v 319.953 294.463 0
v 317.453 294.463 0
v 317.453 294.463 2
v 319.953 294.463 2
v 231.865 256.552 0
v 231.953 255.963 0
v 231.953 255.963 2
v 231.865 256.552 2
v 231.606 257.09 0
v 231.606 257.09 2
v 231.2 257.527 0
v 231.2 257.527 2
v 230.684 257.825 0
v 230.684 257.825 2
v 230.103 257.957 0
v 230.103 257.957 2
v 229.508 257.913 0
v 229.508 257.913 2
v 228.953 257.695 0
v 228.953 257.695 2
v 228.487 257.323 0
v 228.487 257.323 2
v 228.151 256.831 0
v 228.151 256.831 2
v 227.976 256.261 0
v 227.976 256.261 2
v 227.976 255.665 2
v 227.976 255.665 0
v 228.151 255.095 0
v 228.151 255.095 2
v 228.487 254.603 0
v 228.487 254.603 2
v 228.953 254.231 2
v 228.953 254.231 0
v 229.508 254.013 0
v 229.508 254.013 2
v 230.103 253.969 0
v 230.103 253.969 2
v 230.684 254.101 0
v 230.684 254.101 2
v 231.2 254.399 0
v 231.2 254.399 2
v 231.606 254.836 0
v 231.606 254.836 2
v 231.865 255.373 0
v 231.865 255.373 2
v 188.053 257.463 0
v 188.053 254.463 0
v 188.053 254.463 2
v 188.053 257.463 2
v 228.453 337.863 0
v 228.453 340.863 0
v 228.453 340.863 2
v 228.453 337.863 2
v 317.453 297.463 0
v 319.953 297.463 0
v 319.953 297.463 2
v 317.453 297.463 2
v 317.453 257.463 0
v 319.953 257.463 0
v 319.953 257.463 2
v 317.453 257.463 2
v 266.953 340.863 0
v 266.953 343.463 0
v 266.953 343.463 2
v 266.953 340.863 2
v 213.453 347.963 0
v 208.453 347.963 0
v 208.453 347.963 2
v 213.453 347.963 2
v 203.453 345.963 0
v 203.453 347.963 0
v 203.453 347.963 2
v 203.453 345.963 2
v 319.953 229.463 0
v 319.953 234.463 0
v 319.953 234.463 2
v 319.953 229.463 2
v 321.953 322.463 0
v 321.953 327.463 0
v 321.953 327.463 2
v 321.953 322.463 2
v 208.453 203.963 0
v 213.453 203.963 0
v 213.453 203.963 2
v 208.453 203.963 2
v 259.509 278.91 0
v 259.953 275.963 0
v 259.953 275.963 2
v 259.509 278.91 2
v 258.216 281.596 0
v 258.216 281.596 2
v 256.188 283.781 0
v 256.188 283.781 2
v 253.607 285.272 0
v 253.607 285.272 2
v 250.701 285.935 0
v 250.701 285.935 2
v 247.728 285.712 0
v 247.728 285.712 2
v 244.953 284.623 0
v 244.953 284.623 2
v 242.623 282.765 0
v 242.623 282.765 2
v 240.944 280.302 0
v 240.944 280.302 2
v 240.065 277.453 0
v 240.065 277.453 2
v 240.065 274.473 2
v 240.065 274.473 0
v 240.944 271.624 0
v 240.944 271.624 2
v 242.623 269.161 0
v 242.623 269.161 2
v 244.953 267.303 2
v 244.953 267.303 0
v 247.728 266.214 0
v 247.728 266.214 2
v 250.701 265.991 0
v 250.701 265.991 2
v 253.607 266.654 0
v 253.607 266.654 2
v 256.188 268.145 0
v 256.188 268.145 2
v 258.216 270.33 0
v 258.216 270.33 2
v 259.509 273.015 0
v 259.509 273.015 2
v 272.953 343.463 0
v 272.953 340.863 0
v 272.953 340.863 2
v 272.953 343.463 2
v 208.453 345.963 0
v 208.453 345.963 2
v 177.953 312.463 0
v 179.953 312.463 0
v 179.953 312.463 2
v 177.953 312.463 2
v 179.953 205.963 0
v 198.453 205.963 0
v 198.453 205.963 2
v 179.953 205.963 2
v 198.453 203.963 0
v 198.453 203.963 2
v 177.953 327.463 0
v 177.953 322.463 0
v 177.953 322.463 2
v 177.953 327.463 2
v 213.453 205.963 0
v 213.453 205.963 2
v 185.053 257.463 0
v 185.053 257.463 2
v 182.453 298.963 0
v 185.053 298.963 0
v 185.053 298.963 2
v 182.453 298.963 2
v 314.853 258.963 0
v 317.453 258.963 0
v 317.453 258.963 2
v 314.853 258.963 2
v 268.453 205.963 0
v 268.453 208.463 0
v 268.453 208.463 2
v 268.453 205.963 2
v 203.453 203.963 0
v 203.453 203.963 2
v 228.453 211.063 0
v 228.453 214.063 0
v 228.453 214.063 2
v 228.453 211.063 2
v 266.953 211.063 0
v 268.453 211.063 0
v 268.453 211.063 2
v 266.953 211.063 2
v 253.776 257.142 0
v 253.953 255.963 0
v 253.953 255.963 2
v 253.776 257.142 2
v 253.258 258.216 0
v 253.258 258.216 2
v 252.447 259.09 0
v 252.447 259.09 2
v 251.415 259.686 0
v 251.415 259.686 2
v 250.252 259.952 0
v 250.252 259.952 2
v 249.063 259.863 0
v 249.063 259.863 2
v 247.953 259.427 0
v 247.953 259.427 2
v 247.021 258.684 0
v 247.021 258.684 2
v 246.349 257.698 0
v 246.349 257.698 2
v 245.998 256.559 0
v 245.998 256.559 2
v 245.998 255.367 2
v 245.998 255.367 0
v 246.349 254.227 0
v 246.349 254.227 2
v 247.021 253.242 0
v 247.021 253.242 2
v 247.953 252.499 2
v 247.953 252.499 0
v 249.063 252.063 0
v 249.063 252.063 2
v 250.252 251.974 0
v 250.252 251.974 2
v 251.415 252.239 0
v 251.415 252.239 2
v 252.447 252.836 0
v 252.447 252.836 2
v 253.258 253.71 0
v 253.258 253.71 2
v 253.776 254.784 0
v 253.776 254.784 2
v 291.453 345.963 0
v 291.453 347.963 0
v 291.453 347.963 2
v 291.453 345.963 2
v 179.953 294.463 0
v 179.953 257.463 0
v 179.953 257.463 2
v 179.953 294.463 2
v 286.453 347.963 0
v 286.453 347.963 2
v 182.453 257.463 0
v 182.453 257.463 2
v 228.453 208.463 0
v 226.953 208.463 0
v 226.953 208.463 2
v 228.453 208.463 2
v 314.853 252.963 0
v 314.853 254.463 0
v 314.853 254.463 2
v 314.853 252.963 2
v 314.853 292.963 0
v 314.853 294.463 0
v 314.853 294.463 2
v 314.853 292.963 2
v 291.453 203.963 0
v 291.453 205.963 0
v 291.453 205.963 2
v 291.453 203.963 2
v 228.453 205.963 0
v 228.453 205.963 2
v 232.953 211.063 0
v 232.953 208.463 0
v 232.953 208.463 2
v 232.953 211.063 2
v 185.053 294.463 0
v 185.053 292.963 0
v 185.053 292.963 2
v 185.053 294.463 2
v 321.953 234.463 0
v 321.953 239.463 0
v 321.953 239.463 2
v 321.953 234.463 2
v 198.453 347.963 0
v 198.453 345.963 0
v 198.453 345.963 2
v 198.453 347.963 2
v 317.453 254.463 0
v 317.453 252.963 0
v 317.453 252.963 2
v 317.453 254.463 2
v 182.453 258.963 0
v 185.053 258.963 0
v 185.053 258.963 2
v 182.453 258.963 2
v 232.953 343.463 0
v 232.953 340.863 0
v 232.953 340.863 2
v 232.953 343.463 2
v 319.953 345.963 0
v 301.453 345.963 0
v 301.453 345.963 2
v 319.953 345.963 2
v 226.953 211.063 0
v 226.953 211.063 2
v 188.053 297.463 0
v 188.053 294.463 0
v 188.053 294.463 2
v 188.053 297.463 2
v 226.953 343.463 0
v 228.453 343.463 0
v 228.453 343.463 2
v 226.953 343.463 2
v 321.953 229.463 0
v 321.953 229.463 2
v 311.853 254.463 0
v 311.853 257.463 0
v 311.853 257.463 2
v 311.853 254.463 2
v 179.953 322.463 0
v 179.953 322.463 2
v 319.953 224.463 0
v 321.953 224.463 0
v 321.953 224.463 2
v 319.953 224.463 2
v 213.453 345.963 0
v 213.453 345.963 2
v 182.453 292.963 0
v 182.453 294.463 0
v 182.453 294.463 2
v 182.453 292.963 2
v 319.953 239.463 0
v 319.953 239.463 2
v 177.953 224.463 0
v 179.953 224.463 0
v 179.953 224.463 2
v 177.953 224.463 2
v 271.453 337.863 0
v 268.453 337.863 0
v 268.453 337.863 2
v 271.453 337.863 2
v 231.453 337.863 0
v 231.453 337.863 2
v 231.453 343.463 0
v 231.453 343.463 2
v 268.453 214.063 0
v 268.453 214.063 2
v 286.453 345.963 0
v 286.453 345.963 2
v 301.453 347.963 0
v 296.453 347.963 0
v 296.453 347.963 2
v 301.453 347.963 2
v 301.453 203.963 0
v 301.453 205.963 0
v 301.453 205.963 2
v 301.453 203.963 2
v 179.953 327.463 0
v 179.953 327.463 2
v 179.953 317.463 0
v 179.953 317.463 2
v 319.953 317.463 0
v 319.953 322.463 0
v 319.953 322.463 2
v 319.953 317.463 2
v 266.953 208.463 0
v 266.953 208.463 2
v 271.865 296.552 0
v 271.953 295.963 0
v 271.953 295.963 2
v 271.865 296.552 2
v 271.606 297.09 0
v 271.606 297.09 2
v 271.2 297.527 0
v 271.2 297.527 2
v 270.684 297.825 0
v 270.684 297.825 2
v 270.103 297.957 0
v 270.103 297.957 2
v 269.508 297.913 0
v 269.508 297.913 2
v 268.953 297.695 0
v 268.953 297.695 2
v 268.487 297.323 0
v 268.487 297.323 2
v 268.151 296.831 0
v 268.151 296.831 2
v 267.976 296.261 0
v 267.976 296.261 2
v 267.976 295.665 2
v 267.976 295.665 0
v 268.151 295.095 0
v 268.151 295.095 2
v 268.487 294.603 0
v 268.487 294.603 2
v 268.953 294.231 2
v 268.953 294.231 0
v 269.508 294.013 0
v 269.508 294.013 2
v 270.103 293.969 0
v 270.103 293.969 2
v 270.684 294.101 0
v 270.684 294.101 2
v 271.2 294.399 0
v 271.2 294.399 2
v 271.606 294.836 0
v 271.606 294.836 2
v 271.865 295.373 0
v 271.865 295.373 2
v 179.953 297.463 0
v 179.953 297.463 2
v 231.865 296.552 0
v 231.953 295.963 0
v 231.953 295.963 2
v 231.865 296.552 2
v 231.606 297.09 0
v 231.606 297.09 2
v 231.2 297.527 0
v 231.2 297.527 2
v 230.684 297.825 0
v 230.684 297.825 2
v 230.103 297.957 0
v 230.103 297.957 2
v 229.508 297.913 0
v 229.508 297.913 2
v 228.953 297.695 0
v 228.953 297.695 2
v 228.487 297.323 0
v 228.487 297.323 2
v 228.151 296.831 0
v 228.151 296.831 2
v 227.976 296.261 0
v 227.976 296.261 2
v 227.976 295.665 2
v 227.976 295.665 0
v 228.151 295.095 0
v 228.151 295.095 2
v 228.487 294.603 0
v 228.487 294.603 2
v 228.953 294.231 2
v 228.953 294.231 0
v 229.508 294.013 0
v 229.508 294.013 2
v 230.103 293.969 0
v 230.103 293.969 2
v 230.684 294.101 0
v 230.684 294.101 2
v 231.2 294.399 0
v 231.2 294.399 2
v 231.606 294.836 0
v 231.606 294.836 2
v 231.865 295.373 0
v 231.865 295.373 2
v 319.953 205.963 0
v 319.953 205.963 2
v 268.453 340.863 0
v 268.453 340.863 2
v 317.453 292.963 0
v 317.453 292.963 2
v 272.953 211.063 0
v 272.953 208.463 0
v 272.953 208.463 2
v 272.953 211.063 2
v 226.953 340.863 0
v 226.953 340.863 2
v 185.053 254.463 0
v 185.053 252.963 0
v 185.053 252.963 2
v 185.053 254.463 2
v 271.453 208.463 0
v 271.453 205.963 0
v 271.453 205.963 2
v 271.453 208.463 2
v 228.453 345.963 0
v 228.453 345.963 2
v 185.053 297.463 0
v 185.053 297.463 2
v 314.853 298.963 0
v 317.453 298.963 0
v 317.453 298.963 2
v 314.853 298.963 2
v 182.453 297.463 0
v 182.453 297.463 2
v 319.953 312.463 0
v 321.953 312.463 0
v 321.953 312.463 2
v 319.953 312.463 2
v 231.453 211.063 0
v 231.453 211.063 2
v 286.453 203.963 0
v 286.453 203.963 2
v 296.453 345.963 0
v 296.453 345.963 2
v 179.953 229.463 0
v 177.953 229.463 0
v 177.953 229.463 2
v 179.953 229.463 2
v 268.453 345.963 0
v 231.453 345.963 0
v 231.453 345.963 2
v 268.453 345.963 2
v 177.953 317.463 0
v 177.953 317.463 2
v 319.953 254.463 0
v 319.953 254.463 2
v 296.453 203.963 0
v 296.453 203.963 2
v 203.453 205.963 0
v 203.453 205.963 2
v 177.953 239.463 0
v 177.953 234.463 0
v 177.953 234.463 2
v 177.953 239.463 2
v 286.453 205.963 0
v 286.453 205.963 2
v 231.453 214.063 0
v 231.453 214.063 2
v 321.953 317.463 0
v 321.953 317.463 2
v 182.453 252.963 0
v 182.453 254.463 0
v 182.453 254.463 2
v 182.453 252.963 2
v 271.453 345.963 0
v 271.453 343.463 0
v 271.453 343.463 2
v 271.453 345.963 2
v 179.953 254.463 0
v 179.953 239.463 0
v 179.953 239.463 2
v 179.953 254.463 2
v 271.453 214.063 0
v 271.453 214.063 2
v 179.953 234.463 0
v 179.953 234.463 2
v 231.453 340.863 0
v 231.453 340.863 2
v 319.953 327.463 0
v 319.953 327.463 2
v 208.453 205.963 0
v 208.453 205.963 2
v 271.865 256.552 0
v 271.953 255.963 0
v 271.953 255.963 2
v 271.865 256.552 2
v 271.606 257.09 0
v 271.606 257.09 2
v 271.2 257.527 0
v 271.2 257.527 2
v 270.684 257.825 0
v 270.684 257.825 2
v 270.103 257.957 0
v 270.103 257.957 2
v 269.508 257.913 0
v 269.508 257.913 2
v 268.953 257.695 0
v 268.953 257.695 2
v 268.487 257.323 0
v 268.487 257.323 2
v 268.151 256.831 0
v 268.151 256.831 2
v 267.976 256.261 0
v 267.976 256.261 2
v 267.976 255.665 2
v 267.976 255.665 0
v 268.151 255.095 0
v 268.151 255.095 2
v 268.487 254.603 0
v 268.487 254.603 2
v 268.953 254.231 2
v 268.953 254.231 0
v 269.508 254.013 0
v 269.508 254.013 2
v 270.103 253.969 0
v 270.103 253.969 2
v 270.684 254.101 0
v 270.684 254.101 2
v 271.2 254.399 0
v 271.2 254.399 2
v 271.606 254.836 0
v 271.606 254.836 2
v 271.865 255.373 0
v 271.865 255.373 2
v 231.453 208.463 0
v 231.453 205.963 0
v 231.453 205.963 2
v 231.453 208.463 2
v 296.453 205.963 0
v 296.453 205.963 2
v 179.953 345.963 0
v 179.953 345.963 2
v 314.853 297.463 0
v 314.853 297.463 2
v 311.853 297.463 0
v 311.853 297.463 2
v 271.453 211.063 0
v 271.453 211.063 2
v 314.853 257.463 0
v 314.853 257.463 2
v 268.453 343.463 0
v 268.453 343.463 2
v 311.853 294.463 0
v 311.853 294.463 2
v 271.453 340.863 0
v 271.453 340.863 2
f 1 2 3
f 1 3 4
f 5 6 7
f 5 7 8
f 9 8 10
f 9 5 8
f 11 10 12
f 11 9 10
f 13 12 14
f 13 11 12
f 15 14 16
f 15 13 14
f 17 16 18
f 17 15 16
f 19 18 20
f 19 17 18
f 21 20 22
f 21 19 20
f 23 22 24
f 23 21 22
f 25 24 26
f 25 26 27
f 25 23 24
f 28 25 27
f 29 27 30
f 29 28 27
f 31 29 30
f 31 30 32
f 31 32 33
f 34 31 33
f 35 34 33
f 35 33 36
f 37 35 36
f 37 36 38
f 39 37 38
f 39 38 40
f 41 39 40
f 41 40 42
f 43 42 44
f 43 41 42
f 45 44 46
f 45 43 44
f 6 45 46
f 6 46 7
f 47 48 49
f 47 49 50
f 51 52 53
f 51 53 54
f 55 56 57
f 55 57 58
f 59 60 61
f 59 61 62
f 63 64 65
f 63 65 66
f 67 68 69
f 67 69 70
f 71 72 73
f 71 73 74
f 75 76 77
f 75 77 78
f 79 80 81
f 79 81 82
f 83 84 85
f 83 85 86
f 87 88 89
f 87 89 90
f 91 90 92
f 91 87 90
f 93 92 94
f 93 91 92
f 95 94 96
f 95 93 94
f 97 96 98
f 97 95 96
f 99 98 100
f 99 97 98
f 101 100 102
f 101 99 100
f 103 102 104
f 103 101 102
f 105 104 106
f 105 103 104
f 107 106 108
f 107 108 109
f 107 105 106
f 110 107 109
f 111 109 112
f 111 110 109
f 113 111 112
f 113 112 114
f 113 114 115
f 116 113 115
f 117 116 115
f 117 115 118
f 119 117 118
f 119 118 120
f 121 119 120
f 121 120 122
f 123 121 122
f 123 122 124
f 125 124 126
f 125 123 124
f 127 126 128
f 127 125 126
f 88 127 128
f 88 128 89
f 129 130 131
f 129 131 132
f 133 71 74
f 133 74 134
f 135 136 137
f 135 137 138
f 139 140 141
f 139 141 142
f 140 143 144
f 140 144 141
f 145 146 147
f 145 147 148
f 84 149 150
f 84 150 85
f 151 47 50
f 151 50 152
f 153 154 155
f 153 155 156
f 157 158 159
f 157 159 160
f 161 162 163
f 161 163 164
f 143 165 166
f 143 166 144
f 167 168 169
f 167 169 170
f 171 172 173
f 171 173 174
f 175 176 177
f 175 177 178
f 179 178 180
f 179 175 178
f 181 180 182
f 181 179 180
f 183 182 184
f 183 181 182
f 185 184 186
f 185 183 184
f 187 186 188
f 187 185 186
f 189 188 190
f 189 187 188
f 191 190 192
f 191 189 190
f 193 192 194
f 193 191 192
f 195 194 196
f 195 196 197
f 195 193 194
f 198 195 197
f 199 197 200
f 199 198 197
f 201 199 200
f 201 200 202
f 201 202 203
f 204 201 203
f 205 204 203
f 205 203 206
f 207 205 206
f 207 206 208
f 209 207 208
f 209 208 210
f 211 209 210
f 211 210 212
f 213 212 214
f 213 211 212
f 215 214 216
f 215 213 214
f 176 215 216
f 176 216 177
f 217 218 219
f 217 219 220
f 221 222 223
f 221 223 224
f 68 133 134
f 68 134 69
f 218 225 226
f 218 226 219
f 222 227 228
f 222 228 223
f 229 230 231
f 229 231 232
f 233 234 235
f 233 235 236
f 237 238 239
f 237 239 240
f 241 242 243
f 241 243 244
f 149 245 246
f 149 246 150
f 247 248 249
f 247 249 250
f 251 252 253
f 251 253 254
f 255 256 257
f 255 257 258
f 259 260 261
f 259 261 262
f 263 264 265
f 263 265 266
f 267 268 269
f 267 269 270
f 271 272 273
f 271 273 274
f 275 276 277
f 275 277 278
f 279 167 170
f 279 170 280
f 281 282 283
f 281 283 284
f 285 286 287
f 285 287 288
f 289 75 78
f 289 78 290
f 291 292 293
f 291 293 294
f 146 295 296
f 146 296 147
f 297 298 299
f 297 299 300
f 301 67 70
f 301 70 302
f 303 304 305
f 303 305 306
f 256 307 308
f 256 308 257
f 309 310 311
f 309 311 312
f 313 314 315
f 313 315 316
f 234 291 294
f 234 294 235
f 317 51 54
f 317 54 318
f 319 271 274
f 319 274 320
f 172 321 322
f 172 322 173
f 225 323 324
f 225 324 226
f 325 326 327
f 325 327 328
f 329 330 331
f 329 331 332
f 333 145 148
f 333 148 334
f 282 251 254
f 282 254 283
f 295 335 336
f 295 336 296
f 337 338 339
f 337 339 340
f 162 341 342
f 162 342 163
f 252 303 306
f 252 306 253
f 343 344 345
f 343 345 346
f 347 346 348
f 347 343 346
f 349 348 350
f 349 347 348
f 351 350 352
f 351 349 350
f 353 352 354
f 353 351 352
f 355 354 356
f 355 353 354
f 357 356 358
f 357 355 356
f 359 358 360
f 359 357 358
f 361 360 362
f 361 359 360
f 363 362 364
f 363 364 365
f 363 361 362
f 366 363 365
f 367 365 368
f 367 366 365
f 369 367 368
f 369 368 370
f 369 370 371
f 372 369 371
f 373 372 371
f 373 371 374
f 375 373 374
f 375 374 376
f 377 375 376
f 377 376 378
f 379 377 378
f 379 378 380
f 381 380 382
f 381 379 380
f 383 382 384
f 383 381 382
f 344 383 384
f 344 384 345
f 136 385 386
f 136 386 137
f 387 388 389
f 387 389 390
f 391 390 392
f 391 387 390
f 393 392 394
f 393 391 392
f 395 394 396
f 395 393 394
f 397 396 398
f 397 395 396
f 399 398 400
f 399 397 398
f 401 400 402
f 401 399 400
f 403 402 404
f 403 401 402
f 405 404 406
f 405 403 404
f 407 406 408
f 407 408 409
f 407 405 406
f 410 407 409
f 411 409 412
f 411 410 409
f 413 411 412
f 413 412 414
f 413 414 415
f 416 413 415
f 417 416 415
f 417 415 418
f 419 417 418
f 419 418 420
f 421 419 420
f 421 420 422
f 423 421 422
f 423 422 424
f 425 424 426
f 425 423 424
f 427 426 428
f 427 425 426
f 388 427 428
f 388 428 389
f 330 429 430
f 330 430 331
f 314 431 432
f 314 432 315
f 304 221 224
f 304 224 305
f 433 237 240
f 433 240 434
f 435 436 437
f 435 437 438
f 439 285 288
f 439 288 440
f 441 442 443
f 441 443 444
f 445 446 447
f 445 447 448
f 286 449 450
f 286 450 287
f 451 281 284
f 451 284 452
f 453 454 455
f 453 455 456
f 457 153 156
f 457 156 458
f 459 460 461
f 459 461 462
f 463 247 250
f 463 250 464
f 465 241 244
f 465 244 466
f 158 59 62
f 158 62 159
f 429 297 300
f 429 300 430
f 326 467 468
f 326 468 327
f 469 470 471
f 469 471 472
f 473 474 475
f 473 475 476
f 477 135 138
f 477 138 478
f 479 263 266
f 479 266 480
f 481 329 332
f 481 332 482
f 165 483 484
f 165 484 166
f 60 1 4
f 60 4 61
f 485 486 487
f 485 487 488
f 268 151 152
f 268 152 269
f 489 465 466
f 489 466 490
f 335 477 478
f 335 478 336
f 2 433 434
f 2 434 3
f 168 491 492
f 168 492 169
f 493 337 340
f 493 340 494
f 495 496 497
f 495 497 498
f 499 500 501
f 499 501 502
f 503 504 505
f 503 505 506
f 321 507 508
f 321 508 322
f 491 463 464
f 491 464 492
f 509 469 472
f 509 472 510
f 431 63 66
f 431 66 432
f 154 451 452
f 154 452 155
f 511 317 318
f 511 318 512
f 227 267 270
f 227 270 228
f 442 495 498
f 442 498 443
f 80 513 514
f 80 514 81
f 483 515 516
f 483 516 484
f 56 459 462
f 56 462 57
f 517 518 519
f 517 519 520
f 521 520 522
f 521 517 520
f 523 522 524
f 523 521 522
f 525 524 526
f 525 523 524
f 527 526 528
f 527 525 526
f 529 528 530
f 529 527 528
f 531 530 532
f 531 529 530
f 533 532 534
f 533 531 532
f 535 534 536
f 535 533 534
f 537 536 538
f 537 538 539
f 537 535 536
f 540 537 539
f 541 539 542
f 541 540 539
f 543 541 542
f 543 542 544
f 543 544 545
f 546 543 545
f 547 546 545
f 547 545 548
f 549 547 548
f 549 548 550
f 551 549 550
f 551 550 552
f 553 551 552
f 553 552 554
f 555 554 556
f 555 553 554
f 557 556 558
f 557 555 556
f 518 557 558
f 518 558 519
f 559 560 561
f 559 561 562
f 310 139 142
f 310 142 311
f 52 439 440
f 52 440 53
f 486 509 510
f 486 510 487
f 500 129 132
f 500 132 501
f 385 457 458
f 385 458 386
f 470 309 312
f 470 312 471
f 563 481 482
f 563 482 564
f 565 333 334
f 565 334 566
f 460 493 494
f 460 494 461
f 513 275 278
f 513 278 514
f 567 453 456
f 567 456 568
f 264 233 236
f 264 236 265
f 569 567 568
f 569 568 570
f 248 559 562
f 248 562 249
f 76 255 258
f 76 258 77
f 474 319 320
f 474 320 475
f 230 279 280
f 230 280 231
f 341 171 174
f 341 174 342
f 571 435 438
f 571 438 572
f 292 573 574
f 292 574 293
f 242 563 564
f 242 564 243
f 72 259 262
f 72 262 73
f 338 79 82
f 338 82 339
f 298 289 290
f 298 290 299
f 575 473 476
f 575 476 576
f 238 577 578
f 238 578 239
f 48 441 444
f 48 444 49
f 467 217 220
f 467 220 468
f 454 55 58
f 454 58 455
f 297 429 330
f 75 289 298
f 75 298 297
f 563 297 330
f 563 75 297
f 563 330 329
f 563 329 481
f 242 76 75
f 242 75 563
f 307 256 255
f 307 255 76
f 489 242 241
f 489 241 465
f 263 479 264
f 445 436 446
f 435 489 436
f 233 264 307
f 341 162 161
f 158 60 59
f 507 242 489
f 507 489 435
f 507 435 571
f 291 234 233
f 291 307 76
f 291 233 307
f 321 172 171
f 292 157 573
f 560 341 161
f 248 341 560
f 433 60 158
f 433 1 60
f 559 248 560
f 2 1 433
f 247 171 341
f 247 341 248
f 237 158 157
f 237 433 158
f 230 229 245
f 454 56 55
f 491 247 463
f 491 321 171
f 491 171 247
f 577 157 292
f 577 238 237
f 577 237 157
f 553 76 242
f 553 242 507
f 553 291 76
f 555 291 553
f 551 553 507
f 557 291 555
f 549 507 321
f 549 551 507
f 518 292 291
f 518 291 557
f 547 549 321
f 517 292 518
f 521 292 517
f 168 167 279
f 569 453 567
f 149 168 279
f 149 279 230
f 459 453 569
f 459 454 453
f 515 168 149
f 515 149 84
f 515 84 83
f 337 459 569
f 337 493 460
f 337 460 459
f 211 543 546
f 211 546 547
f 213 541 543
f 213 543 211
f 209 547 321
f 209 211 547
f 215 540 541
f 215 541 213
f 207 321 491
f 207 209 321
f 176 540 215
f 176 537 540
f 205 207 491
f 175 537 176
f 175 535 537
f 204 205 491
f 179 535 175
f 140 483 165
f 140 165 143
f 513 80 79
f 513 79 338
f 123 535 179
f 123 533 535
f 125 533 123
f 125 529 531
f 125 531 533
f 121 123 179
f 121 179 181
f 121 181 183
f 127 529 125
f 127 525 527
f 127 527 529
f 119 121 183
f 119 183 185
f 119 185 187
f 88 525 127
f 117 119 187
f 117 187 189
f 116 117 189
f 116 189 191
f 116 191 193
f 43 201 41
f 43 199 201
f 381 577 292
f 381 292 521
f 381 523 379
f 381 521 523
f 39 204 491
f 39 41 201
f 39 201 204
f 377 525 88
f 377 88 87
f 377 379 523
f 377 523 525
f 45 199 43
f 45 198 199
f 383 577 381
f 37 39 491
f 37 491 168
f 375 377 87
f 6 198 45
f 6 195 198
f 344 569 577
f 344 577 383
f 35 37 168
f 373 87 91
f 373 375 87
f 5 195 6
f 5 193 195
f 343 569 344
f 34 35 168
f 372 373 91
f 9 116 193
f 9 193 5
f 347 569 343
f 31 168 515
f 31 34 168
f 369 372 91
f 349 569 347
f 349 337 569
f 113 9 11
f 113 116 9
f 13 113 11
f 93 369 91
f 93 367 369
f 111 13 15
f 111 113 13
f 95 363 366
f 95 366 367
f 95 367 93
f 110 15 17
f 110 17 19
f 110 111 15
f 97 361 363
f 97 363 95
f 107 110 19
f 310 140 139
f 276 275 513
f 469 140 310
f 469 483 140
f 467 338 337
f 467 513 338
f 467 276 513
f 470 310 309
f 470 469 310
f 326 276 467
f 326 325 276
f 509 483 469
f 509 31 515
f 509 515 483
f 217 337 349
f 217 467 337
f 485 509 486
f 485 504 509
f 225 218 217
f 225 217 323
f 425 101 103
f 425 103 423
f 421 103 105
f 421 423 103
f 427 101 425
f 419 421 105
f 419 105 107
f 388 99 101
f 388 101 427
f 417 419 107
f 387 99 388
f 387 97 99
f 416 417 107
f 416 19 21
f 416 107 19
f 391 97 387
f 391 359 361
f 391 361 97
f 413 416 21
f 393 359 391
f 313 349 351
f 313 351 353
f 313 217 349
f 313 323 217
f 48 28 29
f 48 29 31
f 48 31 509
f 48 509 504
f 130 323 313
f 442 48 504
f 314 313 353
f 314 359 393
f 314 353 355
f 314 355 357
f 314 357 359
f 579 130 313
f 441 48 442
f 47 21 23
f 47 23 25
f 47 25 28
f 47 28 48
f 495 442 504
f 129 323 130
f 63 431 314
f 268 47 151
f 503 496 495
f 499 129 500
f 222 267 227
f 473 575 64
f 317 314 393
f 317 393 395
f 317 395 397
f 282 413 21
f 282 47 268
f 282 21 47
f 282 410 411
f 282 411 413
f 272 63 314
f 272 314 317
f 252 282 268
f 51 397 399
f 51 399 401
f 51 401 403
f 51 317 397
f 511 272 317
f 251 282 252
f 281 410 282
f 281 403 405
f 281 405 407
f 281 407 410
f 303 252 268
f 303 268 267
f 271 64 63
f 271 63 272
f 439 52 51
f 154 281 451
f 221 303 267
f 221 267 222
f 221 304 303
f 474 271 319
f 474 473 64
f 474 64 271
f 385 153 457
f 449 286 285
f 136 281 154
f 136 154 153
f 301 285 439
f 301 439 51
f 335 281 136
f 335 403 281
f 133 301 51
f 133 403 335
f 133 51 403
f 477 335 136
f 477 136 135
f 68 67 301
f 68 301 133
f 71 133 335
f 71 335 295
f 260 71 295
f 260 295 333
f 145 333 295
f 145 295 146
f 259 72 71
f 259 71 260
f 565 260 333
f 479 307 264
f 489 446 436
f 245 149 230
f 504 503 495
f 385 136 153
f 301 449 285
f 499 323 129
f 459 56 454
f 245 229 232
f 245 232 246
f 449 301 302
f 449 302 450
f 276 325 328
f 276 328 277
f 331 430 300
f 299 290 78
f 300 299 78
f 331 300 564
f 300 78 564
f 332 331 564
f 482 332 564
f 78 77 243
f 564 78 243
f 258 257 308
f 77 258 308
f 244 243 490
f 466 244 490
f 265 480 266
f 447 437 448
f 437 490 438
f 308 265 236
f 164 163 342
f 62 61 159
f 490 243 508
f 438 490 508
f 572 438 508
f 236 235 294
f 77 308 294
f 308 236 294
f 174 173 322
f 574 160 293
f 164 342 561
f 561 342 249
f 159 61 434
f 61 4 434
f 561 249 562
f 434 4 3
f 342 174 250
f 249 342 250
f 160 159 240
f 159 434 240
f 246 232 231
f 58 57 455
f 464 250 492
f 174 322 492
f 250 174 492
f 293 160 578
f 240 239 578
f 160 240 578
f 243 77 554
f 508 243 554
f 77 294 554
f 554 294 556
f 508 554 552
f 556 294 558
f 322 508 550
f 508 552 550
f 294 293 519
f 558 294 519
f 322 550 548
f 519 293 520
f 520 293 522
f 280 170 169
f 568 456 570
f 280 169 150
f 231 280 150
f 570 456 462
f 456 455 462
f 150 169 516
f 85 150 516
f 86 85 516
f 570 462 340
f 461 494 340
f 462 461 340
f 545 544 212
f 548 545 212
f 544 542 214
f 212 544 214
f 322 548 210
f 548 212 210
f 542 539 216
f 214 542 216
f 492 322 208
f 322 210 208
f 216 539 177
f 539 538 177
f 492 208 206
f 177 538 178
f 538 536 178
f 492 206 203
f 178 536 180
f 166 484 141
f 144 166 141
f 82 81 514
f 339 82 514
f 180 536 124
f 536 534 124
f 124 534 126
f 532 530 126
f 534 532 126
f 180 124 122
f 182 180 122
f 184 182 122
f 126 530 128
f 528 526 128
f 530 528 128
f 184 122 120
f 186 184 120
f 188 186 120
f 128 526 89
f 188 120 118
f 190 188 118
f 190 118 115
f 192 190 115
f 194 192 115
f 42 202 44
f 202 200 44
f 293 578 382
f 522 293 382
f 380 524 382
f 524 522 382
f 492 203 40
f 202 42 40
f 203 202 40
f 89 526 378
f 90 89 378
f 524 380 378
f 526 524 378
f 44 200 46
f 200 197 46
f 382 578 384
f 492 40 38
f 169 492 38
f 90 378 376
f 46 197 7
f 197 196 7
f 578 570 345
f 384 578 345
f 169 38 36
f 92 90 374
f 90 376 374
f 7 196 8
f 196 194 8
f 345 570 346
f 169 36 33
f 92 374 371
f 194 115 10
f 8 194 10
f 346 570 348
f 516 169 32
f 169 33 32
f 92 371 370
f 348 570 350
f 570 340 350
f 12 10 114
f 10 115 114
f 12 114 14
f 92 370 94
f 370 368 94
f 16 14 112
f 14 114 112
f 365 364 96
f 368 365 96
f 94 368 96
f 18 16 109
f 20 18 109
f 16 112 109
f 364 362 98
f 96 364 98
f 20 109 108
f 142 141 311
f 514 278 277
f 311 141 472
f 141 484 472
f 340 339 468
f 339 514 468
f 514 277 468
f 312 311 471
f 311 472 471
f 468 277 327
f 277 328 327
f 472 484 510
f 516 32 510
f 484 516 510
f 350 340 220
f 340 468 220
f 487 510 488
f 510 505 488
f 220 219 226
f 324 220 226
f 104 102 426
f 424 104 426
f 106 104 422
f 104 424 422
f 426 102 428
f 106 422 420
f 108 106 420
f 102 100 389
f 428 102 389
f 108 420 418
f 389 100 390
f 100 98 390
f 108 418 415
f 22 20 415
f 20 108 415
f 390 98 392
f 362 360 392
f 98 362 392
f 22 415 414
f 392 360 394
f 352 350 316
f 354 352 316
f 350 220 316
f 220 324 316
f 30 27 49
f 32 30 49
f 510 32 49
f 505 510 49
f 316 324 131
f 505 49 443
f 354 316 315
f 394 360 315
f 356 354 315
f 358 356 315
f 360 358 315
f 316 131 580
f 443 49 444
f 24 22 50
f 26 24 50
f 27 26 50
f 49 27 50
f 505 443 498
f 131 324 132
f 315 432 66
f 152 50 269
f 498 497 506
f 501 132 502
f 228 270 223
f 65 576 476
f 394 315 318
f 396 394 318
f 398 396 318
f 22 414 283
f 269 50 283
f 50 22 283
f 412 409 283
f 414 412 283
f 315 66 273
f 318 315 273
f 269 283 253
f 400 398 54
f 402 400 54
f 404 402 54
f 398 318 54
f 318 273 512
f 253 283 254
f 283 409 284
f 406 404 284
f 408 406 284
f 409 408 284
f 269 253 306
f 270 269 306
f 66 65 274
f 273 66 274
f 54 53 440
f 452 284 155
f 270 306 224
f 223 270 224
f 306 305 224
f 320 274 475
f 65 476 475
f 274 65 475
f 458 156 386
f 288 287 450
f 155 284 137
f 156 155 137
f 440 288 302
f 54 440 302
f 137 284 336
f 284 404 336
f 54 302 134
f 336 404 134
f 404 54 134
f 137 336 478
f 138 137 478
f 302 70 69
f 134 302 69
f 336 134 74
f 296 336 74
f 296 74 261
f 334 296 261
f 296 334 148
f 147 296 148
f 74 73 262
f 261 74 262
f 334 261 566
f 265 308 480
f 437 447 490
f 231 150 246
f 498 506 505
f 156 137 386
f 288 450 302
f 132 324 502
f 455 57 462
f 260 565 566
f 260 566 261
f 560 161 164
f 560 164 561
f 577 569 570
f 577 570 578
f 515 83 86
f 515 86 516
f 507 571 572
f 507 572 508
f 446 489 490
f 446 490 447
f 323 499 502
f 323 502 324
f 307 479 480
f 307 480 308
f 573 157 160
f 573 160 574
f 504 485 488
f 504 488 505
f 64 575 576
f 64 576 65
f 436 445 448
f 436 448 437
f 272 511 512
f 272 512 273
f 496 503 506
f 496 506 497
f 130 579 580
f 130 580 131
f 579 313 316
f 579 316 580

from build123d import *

# Parameters (mm, degrees)
SKETCH_1_R      = 10
SKETCH_1_R_2    = 4
SKETCH_1_R_3    = 2
EXTRUDE_1_DEPTH = 2


with BuildPart() as part:
    # 草图1 → 凸台-拉伸1 (new body)
    with BuildSketch(Plane.XY):
        Polygon((317.453360513, 257.462931603), (317.453360513, 258.962931603), (314.853360513, 258.962931603), (314.853360513, 257.462931603), (311.853360513, 257.462931603), (311.853360513, 254.462931603), (314.853360513, 254.462931603), (314.853360513, 252.962931603), (317.453360513, 252.962931603), (317.453360513, 254.462931603), (319.953360513, 254.462931603), (319.953360513, 239.462931603), (321.953360513, 239.462931603), (321.953360513, 234.462931603), (319.953360513, 234.462931603), (319.953360513, 229.462931603), (321.953360513, 229.462931603), (321.953360513, 224.462931603), (319.953360513, 224.462931603), (319.953360513, 205.962931603), (301.453360513, 205.962931603), (301.453360513, 203.962931603), (296.453360513, 203.962931603), (296.453360513, 205.962931603), (291.453360513, 205.962931603), (291.453360513, 203.962931603), (286.453360513, 203.962931603), (286.453360513, 205.962931603), (271.453360513, 205.962931603), (271.453360513, 208.462931603), (272.953360513, 208.462931603), (272.953360513, 211.062931603), (271.453360513, 211.062931603), (271.453360513, 214.062931603), (268.453360513, 214.062931603), (268.453360513, 211.062931603), (266.953360513, 211.062931603), (266.953360513, 208.462931603), (268.453360513, 208.462931603), (268.453360513, 205.962931603), (231.453360513, 205.962931603), (231.453360513, 208.462931603), (232.953360513, 208.462931603), (232.953360513, 211.062931603), (231.453360513, 211.062931603), (231.453360513, 214.062931603), (228.453360513, 214.062931603), (228.453360513, 211.062931603), (226.953360513, 211.062931603), (226.953360513, 208.462931603), (228.453360513, 208.462931603), (228.453360513, 205.962931603), (213.453360513, 205.962931603), (213.453360513, 203.962931603), (208.453360513, 203.962931603), (208.453360513, 205.962931603), (203.453360513, 205.962931603), (203.453360513, 203.962931603), (198.453360513, 203.962931603), (198.453360513, 205.962931603), (179.953360513, 205.962931603), (179.953360513, 224.462931603), (177.953360513, 224.462931603), (177.953360513, 229.462931603), (179.953360513, 229.462931603), (179.953360513, 234.462931603), (177.953360513, 234.462931603), (177.953360513, 239.462931603), (179.953360513, 239.462931603), (179.953360513, 254.462931603), (182.453360513, 254.462931603), (182.453360513, 252.962931603), (185.053360513, 252.962931603), (185.053360513, 254.462931603), (188.053360513, 254.462931603), (188.053360513, 257.462931603), (185.053360513, 257.462931603), (185.053360513, 258.962931603), (182.453360513, 258.962931603), (182.453360513, 257.462931603), (179.953360513, 257.462931603), (179.953360513, 294.462931603), (182.453360513, 294.462931603), (182.453360513, 292.962931603), (185.053360513, 292.962931603), (185.053360513, 294.462931603), (188.053360513, 294.462931603), (188.053360513, 297.462931603), (185.053360513, 297.462931603), (185.053360513, 298.962931603), (182.453360513, 298.962931603), (182.453360513, 297.462931603), (179.953360513, 297.462931603), (179.953360513, 312.462931603), (177.953360513, 312.462931603), (177.953360513, 317.462931603), (179.953360513, 317.462931603), (179.953360513, 322.462931603), (177.953360513, 322.462931603), (177.953360513, 327.462931603), (179.953360513, 327.462931603), (179.953360513, 345.962931603), (198.453360513, 345.962931603), (198.453360513, 347.962931603), (203.453360513, 347.962931603), (203.453360513, 345.962931603), (208.453360513, 345.962931603), (208.453360513, 347.962931603), (213.453360513, 347.962931603), (213.453360513, 345.962931603), (228.453360513, 345.962931603), (228.453360513, 343.462931603), (226.953360513, 343.462931603), (226.953360513, 340.862931603), (228.453360513, 340.862931603), (228.453360513, 337.862931603), (231.453360513, 337.862931603), (231.453360513, 340.862931603), (232.953360513, 340.862931603), (232.953360513, 343.462931603), (231.453360513, 343.462931603), (231.453360513, 345.962931603), (268.453360513, 345.962931603), (268.453360513, 343.462931603), (266.953360513, 343.462931603), (266.953360513, 340.862931603), (268.453360513, 340.862931603), (268.453360513, 337.862931603), (271.453360513, 337.862931603), (271.453360513, 340.862931603), (272.953360513, 340.862931603), (272.953360513, 343.462931603), (271.453360513, 343.462931603), (271.453360513, 345.962931603), (286.453360513, 345.962931603), (286.453360513, 347.962931603), (291.453360513, 347.962931603), (291.453360513, 345.962931603), (296.453360513, 345.962931603), (296.453360513, 347.962931603), (301.453360513, 347.962931603), (301.453360513, 345.962931603), (319.953360513, 345.962931603), (319.953360513, 327.462931603), (321.953360513, 327.462931603), (321.953360513, 322.462931603), (319.953360513, 322.462931603), (319.953360513, 317.462931603), (321.953360513, 317.462931603), (321.953360513, 312.462931603), (319.953360513, 312.462931603), (319.953360513, 297.462931603), (317.453360513, 297.462931603), (317.453360513, 298.962931603), (314.853360513, 298.962931603), (314.853360513, 297.462931603), (311.853360513, 297.462931603), (311.853360513, 294.462931603), (314.853360513, 294.462931603), (314.853360513, 292.962931603), (317.453360513, 292.962931603), (317.453360513, 294.462931603), (319.953360513, 294.462931603), (319.953360513, 257.462931603), align=None)
        with Locations((249.953360513, 275.962931603)):
            Circle(SKETCH_1_R, mode=Mode.SUBTRACT)
        with Locations((249.953360513, 255.962931603)):
            Circle(SKETCH_1_R_2, mode=Mode.SUBTRACT)
        with Locations((229.953360513, 255.962931603)):
            Circle(SKETCH_1_R_3, mode=Mode.SUBTRACT)
        with Locations((229.953360513, 295.962931603)):
            Circle(SKETCH_1_R_3, mode=Mode.SUBTRACT)
        with Locations((269.953360513, 295.962931603)):
            Circle(SKETCH_1_R_3, mode=Mode.SUBTRACT)
        with Locations((269.953360513, 255.962931603)):
            Circle(SKETCH_1_R_3, mode=Mode.SUBTRACT)
    extrude(amount=EXTRUDE_1_DEPTH)


solid = part.part
